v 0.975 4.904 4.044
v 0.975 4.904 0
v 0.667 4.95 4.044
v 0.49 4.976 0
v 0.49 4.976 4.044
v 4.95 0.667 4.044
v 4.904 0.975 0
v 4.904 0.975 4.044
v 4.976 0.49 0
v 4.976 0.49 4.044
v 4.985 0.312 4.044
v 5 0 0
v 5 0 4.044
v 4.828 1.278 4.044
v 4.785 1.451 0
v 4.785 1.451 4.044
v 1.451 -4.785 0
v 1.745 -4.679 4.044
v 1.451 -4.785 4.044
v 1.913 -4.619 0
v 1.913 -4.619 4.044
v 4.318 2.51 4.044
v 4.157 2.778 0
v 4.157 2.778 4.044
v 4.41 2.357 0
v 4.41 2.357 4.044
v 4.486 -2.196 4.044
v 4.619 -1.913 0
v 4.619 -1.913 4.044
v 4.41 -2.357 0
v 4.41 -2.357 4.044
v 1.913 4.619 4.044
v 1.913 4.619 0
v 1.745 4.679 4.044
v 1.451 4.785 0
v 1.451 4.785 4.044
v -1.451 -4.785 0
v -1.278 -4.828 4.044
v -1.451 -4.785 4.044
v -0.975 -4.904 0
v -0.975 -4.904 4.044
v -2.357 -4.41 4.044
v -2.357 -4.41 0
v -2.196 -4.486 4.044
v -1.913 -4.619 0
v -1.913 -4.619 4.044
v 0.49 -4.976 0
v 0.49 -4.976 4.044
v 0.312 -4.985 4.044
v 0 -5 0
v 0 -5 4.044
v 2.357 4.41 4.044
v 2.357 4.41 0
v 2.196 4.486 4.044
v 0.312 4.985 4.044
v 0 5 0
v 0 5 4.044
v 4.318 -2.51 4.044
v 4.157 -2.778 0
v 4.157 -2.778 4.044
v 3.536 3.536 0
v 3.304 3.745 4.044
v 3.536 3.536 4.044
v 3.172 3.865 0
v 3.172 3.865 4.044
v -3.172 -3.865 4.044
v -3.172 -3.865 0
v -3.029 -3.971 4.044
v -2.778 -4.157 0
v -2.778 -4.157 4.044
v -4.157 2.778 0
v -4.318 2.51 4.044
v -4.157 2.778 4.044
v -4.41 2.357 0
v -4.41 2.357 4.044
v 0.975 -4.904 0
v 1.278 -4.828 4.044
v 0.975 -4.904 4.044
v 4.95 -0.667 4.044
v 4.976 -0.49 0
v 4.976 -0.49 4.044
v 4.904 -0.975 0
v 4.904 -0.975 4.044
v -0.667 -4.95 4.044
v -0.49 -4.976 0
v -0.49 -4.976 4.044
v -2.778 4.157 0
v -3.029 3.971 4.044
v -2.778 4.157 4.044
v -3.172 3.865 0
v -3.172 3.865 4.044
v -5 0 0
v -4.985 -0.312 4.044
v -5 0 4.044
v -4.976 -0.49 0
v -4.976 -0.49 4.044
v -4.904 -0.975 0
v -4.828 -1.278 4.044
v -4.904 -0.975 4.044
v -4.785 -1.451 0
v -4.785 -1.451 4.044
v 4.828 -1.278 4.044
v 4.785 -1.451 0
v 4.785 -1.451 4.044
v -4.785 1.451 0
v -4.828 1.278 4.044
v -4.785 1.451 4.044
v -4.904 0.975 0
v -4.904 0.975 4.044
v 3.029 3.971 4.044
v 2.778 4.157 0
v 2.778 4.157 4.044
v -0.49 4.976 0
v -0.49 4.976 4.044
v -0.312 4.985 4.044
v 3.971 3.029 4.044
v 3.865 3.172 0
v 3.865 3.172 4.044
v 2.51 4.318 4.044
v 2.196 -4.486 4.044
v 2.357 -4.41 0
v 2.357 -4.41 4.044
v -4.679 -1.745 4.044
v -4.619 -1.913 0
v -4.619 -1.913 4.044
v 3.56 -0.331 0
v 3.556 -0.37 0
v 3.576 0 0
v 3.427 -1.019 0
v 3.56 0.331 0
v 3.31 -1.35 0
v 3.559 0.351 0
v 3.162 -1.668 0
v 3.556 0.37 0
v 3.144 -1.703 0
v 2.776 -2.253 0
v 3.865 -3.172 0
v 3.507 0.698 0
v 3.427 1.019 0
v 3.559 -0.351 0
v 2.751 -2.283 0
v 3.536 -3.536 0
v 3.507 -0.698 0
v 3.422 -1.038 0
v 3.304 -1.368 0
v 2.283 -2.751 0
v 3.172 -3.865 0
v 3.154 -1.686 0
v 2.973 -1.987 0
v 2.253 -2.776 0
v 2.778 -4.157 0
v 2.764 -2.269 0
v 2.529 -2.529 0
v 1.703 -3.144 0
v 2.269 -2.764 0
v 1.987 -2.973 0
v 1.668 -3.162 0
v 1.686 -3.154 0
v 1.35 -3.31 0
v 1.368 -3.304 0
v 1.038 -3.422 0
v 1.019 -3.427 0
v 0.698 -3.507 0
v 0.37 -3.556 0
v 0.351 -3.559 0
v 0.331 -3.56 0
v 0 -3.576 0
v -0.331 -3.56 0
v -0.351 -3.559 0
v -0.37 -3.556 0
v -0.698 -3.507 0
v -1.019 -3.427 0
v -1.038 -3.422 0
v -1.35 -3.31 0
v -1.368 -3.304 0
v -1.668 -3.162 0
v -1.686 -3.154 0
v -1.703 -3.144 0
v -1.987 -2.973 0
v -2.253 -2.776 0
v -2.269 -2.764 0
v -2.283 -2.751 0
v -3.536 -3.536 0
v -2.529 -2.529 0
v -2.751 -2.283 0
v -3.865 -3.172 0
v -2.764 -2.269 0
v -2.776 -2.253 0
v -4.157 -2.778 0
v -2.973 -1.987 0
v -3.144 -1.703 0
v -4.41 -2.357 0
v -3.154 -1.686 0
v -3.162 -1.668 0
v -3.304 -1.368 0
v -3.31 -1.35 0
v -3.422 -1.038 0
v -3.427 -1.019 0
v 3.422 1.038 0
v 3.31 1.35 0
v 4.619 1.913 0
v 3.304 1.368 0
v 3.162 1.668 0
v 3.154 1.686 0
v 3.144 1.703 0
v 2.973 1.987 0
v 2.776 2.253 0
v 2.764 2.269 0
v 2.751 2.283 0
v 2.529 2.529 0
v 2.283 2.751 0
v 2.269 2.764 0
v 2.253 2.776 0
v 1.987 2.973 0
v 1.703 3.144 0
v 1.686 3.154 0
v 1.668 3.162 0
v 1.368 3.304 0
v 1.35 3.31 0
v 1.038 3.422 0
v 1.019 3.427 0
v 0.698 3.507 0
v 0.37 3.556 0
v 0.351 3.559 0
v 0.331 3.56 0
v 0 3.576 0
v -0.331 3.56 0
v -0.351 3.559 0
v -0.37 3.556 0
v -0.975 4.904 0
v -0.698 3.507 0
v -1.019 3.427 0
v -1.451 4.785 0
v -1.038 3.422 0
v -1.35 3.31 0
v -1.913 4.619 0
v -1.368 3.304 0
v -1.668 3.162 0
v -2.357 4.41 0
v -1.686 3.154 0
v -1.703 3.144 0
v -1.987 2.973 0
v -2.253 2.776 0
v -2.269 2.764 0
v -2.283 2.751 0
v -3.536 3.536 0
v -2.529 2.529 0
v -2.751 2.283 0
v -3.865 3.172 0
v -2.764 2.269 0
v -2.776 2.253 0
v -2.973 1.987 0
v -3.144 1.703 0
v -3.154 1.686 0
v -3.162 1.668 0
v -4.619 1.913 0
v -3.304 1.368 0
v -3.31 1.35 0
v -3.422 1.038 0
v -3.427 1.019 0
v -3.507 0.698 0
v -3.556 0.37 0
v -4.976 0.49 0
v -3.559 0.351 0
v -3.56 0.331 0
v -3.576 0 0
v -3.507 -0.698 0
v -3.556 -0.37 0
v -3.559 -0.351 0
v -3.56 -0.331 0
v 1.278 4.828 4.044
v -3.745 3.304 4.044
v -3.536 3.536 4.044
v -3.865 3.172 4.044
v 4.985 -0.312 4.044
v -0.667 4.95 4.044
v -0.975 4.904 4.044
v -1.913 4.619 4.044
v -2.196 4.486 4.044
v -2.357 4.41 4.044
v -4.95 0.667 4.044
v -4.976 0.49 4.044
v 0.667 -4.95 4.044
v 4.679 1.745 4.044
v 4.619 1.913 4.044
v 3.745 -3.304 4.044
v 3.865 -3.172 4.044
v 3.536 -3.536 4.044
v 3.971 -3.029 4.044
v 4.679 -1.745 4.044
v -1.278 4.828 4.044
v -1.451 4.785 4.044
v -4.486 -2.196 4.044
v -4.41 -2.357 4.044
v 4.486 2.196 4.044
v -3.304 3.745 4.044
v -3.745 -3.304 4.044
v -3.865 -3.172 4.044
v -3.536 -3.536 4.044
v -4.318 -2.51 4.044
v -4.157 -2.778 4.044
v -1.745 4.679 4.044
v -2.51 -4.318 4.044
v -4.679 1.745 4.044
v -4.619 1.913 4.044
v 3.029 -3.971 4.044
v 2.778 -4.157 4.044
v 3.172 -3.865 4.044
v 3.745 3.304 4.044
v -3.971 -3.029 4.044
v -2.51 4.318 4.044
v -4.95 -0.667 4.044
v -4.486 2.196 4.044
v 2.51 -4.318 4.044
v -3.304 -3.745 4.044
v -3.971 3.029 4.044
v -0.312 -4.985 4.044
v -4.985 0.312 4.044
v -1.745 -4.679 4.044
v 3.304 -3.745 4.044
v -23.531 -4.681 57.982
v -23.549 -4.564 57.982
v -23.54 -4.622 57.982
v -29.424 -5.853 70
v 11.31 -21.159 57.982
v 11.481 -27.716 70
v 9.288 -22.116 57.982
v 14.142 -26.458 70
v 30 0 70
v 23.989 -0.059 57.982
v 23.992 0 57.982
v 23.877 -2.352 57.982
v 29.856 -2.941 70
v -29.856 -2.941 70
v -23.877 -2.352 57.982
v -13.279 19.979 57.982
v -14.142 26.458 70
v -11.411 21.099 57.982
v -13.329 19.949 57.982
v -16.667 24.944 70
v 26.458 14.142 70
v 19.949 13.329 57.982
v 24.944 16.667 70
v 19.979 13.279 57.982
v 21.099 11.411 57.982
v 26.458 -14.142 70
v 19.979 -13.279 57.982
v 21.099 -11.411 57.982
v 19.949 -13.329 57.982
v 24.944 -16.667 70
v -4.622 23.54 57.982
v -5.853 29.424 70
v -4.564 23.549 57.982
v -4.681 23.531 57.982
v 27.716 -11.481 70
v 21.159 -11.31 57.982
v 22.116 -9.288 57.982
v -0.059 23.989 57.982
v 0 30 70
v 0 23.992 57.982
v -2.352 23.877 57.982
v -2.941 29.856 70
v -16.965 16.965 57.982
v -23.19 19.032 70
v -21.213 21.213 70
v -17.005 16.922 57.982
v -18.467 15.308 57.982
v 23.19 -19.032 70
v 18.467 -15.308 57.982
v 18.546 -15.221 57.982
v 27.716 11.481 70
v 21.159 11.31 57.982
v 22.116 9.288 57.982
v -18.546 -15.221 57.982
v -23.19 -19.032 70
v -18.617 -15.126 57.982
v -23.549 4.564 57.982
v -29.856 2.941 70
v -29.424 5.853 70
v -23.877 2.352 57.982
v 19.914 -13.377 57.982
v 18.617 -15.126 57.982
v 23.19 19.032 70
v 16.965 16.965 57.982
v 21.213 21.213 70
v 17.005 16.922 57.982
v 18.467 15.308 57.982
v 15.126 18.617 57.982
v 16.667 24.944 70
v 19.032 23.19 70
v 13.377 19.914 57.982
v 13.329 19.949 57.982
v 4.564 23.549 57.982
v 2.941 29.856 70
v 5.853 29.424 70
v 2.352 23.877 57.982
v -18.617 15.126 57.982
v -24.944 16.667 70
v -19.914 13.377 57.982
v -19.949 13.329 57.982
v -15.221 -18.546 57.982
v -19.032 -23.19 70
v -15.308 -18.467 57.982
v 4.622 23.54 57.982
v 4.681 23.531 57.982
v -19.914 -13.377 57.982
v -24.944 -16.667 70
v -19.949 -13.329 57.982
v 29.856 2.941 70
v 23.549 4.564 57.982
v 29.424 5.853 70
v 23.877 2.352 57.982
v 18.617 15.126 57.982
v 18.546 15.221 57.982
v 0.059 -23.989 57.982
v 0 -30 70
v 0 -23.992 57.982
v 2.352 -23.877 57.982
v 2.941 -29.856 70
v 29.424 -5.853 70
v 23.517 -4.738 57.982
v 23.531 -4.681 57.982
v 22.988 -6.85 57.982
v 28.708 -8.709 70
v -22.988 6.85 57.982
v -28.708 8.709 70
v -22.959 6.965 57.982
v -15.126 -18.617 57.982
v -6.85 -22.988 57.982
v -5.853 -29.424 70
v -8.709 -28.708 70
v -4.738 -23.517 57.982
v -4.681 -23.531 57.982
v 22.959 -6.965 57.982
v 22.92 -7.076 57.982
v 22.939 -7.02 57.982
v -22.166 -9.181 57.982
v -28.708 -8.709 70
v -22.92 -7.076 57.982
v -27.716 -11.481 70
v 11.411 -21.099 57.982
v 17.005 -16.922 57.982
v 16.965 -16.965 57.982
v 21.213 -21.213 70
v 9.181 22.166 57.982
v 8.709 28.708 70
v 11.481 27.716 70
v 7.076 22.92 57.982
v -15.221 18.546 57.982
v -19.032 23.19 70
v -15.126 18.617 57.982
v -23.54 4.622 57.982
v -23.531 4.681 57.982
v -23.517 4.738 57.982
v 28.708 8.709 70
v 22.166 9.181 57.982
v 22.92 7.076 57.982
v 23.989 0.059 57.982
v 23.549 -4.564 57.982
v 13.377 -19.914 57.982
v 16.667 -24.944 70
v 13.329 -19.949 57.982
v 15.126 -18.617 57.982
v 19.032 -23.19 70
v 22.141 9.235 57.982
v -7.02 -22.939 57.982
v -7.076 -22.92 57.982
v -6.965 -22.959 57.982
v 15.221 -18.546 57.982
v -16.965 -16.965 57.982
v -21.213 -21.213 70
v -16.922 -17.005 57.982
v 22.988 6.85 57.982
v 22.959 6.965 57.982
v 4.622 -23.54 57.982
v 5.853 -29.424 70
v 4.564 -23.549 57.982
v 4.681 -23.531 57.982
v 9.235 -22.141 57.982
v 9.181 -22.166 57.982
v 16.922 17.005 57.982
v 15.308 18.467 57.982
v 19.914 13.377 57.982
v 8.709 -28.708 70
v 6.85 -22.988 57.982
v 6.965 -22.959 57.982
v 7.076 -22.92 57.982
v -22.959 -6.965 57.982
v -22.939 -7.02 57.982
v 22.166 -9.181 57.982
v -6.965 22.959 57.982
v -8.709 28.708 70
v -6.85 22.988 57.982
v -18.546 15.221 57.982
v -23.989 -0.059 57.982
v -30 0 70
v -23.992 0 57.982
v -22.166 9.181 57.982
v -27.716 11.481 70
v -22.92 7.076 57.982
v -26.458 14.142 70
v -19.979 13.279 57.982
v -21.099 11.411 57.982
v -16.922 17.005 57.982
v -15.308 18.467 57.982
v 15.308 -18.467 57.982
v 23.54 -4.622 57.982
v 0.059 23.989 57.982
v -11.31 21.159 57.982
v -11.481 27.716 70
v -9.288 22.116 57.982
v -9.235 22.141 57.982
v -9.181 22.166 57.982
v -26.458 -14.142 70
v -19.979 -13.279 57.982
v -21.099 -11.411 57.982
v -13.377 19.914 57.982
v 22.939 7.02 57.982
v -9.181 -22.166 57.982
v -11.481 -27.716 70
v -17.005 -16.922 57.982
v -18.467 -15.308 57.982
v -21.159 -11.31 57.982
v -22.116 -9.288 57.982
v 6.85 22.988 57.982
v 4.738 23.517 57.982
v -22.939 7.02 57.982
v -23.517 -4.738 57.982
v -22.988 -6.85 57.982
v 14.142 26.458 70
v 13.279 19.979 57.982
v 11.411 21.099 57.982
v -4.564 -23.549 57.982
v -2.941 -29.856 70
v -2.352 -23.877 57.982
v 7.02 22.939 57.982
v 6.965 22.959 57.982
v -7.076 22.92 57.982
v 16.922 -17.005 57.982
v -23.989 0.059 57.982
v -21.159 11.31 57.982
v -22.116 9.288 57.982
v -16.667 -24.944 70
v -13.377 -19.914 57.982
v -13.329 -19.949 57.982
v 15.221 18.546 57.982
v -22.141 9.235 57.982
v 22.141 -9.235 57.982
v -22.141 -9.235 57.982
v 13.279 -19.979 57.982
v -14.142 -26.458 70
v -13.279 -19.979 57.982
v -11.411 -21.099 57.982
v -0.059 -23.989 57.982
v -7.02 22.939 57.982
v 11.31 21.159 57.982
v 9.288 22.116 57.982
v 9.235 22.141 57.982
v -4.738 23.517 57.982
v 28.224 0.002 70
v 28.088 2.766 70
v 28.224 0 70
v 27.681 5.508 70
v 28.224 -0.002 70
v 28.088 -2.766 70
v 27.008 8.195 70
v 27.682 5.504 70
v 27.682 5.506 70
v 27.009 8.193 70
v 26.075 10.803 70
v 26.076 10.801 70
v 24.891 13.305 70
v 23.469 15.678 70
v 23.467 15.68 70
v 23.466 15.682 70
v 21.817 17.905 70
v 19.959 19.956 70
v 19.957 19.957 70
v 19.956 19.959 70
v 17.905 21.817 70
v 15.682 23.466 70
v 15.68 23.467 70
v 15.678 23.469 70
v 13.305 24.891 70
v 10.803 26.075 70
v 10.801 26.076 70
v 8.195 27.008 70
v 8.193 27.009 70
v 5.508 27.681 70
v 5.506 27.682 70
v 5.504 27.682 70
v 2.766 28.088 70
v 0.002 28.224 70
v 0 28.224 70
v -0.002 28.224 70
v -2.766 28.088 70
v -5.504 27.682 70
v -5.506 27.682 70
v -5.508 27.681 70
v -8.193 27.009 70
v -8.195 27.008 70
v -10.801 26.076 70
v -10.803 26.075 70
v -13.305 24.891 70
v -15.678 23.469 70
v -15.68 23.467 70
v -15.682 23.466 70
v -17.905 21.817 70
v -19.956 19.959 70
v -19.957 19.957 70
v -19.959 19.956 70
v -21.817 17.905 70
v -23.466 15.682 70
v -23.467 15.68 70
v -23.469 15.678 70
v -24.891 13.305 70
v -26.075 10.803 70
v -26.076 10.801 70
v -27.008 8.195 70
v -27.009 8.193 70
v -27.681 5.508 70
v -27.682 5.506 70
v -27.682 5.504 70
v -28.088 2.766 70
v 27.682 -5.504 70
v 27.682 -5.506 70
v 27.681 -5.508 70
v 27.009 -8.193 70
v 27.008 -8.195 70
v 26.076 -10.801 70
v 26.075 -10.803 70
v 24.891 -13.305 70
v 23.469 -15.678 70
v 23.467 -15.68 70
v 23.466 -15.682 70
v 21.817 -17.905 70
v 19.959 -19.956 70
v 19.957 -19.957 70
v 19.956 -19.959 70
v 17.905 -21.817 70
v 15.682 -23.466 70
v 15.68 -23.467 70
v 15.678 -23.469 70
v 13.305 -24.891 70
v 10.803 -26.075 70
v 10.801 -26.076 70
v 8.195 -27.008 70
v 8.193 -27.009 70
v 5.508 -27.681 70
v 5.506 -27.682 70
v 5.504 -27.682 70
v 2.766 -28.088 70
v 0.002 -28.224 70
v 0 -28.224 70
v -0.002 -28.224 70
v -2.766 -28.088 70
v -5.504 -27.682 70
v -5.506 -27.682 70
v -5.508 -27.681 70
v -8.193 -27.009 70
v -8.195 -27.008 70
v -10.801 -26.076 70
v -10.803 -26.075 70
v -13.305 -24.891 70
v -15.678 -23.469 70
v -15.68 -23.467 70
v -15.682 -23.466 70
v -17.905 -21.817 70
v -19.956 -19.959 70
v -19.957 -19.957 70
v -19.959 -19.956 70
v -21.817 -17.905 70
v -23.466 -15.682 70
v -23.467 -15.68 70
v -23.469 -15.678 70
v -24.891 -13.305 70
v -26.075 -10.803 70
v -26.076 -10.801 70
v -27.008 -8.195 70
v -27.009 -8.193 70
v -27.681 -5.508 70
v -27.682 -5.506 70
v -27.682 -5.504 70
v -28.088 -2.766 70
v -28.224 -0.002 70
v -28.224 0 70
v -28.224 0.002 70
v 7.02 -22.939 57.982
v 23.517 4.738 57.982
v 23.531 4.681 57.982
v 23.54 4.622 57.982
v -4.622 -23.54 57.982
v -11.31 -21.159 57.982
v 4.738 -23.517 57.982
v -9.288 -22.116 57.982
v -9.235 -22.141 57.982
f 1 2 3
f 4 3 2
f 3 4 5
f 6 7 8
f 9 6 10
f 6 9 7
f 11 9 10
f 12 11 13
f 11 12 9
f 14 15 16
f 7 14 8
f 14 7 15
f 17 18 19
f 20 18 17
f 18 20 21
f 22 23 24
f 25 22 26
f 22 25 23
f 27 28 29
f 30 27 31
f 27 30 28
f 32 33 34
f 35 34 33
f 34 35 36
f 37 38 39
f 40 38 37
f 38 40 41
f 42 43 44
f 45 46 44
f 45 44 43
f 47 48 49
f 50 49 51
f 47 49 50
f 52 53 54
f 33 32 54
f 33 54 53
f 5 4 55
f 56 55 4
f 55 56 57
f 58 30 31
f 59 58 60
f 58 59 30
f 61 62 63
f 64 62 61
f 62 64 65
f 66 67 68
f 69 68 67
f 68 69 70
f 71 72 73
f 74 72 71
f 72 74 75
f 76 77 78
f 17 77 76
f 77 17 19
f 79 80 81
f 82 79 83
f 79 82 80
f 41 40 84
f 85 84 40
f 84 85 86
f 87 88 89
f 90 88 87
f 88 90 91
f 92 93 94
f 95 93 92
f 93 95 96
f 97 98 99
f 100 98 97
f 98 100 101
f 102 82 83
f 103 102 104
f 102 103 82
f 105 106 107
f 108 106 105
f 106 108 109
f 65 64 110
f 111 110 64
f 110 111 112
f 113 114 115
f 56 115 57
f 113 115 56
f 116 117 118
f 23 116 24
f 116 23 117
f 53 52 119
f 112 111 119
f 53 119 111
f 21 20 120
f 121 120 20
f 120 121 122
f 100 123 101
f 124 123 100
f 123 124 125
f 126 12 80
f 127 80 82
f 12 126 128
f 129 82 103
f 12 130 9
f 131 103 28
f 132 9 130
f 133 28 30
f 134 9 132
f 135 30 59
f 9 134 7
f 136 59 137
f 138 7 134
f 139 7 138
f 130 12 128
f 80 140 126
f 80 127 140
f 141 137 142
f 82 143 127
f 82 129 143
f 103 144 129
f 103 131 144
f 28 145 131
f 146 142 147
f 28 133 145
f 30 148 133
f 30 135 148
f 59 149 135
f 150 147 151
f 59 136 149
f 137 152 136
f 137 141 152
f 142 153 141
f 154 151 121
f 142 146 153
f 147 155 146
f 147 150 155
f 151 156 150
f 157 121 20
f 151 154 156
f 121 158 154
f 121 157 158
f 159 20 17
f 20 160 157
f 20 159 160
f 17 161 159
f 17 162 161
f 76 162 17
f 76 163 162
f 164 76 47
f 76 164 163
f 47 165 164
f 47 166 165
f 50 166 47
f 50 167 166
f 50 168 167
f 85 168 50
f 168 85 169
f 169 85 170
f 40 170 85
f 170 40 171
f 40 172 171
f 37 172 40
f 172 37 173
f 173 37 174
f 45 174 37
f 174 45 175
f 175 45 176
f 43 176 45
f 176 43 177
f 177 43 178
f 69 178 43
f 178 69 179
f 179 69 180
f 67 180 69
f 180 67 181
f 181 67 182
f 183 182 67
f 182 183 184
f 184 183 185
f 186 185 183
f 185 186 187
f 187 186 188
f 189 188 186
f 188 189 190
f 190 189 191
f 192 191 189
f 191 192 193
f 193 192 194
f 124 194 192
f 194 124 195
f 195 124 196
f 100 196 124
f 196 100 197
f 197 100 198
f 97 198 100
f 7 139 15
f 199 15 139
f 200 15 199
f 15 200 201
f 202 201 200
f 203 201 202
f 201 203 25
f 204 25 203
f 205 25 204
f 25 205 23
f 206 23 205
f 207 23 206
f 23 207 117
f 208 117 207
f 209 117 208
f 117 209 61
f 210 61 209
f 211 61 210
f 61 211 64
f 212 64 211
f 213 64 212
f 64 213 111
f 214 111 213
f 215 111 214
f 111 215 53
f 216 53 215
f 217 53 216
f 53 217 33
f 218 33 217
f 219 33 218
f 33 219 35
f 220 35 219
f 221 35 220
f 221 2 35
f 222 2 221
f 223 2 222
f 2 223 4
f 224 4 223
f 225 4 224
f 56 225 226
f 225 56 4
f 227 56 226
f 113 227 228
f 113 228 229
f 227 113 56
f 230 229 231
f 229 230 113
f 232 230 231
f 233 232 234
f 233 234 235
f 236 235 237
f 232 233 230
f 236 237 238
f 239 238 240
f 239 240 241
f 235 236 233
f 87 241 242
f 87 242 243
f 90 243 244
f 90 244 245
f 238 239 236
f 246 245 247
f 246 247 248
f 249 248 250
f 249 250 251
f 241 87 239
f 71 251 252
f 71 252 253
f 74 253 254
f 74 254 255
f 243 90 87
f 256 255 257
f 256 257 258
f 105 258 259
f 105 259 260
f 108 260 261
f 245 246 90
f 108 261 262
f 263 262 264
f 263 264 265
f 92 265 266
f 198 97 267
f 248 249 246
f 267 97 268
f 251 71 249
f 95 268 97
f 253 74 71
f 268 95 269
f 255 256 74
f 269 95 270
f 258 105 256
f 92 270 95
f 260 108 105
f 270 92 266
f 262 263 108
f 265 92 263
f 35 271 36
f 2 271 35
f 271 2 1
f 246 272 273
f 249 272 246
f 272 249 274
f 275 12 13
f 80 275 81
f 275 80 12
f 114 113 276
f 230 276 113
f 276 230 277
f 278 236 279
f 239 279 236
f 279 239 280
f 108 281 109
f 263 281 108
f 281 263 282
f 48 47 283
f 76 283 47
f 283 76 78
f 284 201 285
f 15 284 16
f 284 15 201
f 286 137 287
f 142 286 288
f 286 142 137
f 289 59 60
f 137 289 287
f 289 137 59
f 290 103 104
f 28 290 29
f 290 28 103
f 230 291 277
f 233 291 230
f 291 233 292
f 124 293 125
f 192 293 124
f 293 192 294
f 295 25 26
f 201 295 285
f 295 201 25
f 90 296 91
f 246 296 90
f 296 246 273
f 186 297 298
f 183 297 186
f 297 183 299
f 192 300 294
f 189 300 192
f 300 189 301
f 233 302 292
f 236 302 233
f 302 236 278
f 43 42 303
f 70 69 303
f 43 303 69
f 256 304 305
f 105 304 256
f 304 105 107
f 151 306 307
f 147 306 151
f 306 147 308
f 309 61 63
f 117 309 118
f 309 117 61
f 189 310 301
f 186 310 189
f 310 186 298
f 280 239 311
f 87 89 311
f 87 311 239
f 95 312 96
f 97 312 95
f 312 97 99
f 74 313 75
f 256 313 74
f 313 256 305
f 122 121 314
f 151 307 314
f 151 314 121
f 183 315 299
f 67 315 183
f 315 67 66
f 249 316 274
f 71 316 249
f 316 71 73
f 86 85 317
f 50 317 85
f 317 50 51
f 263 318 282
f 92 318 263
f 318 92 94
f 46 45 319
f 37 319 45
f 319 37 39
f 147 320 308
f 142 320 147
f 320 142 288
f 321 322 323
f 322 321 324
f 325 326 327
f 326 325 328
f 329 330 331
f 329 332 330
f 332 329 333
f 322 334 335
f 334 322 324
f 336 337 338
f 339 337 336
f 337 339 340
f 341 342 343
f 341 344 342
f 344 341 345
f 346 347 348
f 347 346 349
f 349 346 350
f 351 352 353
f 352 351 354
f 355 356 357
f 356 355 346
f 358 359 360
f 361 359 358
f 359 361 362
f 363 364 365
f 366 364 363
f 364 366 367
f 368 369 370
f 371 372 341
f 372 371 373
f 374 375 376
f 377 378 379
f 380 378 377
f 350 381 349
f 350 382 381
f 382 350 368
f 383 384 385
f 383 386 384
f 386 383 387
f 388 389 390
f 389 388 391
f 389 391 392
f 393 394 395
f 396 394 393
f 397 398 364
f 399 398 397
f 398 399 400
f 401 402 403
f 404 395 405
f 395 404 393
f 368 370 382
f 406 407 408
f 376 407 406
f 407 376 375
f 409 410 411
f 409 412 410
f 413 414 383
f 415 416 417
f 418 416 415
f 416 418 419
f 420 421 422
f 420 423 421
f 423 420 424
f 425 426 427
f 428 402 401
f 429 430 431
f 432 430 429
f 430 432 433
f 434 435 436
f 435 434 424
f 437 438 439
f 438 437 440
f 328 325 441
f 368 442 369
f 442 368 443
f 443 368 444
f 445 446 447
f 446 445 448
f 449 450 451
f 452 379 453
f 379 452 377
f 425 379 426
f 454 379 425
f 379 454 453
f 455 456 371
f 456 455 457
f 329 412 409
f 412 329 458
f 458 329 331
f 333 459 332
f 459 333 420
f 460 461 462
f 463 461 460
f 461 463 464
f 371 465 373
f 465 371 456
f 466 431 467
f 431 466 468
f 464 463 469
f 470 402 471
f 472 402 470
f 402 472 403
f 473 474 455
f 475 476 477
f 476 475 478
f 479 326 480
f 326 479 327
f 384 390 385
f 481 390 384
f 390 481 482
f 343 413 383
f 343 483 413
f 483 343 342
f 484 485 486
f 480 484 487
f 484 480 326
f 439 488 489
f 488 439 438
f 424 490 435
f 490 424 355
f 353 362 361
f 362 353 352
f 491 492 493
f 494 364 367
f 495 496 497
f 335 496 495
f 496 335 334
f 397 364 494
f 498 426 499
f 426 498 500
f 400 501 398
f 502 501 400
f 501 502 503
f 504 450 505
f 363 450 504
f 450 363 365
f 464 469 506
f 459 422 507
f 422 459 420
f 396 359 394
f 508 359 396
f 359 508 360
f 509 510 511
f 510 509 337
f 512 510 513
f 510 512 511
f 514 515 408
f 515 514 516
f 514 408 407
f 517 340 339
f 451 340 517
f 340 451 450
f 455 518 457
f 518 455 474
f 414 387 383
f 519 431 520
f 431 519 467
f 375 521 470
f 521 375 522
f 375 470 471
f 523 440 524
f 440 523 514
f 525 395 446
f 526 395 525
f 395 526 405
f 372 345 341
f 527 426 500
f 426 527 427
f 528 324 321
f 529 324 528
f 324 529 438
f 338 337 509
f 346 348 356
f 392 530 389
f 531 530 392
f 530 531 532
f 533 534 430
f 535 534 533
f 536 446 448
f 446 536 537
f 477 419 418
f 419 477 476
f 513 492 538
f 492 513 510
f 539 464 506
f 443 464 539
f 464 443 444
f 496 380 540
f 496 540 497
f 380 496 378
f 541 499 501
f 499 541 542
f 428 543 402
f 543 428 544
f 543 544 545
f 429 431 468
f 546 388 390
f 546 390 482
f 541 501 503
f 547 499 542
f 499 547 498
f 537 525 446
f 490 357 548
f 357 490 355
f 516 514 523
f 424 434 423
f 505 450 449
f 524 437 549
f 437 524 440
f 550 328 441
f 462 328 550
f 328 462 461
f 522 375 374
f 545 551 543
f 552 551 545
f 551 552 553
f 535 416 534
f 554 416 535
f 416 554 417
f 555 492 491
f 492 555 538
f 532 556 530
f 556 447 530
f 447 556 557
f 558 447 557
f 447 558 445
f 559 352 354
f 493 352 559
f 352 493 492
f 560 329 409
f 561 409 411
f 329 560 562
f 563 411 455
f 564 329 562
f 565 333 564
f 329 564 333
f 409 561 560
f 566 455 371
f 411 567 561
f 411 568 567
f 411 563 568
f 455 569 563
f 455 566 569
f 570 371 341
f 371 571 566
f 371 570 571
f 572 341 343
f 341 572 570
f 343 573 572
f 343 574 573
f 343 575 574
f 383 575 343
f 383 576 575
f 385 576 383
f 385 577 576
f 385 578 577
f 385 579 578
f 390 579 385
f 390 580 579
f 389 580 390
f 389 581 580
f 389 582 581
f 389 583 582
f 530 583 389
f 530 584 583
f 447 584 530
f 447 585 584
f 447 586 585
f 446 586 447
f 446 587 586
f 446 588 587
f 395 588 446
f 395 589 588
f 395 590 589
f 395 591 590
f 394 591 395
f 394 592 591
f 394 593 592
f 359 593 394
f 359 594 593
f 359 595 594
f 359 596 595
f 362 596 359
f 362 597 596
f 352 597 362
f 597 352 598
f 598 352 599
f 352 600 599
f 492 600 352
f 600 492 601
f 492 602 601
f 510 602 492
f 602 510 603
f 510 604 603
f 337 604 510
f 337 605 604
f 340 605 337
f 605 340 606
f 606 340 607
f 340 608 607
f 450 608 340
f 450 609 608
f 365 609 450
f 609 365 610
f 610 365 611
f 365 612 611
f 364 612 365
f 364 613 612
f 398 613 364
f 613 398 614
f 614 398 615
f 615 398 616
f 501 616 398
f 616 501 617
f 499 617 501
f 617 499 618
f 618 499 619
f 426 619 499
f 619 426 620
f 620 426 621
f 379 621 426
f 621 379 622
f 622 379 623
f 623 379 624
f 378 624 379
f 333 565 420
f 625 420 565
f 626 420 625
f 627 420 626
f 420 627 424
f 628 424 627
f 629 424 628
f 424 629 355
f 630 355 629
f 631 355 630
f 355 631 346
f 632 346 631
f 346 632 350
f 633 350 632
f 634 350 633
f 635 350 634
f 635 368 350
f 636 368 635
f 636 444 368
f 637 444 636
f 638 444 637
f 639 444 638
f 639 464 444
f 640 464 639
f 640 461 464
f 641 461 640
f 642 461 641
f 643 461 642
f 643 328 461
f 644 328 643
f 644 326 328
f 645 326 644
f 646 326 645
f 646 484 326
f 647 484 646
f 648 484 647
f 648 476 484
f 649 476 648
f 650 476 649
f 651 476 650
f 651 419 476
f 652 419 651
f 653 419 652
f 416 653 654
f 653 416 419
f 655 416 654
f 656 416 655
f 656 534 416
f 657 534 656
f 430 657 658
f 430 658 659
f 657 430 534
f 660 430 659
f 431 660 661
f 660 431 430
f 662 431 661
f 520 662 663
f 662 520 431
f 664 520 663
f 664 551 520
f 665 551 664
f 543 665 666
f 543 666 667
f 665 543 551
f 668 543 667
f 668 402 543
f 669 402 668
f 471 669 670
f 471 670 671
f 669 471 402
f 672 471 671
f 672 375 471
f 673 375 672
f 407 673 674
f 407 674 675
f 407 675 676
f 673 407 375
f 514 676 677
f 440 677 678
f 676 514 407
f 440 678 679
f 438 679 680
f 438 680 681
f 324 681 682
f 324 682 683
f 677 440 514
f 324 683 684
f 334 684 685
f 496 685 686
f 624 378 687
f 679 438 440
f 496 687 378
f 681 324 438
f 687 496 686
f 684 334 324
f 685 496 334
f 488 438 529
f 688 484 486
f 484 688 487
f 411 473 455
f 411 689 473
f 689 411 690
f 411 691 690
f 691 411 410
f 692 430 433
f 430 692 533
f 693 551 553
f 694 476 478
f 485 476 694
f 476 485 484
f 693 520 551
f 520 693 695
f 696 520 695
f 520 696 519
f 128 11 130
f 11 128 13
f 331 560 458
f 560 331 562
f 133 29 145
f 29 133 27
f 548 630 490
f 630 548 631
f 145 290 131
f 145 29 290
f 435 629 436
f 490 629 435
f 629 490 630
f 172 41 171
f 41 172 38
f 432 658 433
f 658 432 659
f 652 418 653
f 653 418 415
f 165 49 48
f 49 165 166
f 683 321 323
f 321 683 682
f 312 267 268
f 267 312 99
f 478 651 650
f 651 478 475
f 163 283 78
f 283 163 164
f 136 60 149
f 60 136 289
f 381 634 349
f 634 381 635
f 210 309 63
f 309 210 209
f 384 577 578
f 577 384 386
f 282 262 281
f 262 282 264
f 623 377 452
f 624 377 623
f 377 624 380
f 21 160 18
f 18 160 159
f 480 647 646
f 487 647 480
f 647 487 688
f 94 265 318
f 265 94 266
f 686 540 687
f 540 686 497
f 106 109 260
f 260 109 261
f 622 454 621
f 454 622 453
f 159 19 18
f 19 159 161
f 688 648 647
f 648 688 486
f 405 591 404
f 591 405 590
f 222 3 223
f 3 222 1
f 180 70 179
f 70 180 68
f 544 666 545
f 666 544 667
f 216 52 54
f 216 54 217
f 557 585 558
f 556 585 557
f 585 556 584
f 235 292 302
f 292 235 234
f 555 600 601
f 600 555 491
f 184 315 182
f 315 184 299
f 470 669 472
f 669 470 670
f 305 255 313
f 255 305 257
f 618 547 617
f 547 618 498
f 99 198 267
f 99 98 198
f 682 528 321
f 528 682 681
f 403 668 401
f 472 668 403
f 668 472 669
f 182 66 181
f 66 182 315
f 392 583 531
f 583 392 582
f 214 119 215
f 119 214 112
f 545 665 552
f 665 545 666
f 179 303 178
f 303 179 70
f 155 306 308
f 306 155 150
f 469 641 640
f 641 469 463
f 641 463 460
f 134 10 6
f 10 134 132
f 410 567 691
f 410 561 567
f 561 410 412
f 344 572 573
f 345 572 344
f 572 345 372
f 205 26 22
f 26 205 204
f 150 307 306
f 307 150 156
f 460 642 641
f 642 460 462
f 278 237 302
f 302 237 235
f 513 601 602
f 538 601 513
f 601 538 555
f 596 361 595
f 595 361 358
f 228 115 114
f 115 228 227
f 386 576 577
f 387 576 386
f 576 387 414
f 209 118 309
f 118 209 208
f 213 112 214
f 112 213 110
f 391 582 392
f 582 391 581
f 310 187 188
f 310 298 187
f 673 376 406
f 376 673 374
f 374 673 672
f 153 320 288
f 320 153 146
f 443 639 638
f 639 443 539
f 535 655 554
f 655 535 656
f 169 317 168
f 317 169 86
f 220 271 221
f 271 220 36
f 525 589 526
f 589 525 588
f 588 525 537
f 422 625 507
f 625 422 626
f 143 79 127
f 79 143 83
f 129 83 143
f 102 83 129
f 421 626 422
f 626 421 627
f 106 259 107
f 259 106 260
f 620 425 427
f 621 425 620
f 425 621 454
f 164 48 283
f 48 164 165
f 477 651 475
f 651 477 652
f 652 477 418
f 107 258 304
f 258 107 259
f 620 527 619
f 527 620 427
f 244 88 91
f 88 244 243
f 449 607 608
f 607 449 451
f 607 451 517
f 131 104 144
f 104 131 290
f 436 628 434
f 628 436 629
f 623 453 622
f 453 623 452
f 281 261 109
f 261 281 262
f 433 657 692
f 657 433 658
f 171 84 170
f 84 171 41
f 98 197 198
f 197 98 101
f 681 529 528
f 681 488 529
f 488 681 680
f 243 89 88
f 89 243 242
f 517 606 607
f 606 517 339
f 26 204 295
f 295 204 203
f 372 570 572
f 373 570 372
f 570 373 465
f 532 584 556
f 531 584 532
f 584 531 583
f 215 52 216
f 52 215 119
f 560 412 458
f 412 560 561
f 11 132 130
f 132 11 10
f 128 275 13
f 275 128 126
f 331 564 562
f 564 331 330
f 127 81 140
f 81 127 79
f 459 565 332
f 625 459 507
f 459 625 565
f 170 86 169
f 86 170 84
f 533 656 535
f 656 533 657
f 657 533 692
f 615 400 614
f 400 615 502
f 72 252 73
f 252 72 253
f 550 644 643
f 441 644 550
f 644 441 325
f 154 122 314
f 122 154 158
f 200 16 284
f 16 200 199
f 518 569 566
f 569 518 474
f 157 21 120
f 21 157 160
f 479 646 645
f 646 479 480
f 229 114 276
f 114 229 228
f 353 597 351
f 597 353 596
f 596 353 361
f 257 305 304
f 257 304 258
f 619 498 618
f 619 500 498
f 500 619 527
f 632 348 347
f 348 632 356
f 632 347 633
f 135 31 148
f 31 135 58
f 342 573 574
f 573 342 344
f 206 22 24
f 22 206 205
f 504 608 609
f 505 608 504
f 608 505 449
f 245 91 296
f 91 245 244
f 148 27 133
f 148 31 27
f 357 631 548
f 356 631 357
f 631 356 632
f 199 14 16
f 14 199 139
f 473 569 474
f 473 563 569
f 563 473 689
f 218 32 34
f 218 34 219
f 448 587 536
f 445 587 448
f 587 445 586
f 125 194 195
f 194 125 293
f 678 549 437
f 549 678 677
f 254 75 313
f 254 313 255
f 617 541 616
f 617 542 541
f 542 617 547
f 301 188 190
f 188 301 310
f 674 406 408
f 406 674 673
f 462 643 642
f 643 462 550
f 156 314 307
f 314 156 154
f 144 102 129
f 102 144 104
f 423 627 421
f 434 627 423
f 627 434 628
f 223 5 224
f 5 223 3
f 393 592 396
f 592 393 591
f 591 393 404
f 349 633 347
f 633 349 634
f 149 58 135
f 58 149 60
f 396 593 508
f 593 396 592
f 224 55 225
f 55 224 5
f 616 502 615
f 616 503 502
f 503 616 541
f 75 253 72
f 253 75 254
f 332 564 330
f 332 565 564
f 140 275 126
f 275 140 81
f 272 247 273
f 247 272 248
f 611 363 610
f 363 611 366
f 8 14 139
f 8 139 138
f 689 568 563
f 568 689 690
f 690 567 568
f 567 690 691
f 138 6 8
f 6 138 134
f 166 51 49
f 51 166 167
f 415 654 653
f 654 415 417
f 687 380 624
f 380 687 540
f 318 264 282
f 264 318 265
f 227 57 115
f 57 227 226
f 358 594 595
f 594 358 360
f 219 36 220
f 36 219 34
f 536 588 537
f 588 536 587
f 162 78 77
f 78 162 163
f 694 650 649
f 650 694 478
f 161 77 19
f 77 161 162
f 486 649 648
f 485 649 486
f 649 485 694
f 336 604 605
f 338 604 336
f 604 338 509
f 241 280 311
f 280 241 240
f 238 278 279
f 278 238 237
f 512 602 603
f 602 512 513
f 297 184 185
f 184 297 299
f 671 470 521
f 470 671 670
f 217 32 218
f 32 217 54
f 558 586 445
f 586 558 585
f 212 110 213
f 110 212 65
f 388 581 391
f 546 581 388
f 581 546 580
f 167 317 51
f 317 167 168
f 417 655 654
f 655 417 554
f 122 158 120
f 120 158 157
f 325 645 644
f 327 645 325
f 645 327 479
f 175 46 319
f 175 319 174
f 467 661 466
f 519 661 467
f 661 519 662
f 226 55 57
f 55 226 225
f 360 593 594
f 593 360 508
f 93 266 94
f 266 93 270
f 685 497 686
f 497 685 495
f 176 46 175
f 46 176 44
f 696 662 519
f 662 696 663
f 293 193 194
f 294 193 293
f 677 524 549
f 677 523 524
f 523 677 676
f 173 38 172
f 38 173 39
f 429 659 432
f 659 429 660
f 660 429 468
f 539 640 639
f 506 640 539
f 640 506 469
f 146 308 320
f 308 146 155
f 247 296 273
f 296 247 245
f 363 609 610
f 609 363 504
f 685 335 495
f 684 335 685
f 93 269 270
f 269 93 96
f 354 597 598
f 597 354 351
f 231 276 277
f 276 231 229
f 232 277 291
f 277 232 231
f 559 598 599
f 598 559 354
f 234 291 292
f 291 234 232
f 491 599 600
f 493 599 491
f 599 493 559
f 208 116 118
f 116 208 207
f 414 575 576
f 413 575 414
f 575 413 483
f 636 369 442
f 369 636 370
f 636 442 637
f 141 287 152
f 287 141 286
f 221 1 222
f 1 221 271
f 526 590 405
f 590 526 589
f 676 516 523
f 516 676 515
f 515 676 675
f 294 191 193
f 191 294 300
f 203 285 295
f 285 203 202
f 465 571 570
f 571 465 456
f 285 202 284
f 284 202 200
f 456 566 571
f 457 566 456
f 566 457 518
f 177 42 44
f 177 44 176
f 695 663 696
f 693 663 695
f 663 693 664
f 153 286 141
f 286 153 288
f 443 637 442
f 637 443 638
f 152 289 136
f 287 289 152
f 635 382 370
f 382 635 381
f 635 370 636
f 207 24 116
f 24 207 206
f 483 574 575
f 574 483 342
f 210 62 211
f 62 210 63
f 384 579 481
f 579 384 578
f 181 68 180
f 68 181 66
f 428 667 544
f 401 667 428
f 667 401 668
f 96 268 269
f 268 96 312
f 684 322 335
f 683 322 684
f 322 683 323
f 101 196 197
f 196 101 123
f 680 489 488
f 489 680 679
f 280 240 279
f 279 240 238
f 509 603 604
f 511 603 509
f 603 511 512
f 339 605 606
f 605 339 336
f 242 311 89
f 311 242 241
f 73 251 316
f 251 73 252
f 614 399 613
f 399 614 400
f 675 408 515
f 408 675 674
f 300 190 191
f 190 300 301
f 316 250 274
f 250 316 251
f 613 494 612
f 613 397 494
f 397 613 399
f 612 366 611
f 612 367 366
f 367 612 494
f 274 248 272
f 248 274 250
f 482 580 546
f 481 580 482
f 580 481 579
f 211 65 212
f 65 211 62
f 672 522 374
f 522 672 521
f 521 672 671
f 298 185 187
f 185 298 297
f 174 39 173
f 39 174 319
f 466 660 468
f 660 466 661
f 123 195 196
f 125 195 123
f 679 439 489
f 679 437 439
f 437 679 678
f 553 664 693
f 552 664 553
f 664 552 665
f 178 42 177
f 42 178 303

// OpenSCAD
// Small lab funnel, printed upright with wide opening at top
// Units: mm

$fn = 64;

// --- Dimensions ---
spout_od      = 10;    // spout outer diameter
spout_h       = 20;    // spout height (z = 0 to 20)
cone_top_d    = 10;    // cone diameter at spout top (z = 20)
cone_rim_d    = 60;    // cone rim diameter (z = 50)
wall          = 1.6;   // wall thickness everywhere
overlap       = 0.01;  // small overlap between spout and cone for clean union

eps           = 0.5;   // cutter overshoot past faces

// --- Model ---
difference() {
    union() {
        // Spout (tube)
        cylinder(d = spout_od, h = spout_h);

        // Cone, starting slightly inside the spout top
        translate([0, 0, spout_h - overlap])
            cylinder(d1 = cone_top_d, d2 = cone_rim_d, h = cone_rim_d - cone_top_d + overlap);
    }

    // Through-bore: bore the spout and continue the bore along the cone wall
    // (bore diameter grows with the cone, so liquid runs straight through)
    translate([0, 0, -eps])
        cylinder(d1 = spout_od - 2 * wall,
                 d2 = cone_rim_d - 2 * wall,
                 h = spout_h + 2 * eps + (cone_rim_d - cone_top_d));
}
